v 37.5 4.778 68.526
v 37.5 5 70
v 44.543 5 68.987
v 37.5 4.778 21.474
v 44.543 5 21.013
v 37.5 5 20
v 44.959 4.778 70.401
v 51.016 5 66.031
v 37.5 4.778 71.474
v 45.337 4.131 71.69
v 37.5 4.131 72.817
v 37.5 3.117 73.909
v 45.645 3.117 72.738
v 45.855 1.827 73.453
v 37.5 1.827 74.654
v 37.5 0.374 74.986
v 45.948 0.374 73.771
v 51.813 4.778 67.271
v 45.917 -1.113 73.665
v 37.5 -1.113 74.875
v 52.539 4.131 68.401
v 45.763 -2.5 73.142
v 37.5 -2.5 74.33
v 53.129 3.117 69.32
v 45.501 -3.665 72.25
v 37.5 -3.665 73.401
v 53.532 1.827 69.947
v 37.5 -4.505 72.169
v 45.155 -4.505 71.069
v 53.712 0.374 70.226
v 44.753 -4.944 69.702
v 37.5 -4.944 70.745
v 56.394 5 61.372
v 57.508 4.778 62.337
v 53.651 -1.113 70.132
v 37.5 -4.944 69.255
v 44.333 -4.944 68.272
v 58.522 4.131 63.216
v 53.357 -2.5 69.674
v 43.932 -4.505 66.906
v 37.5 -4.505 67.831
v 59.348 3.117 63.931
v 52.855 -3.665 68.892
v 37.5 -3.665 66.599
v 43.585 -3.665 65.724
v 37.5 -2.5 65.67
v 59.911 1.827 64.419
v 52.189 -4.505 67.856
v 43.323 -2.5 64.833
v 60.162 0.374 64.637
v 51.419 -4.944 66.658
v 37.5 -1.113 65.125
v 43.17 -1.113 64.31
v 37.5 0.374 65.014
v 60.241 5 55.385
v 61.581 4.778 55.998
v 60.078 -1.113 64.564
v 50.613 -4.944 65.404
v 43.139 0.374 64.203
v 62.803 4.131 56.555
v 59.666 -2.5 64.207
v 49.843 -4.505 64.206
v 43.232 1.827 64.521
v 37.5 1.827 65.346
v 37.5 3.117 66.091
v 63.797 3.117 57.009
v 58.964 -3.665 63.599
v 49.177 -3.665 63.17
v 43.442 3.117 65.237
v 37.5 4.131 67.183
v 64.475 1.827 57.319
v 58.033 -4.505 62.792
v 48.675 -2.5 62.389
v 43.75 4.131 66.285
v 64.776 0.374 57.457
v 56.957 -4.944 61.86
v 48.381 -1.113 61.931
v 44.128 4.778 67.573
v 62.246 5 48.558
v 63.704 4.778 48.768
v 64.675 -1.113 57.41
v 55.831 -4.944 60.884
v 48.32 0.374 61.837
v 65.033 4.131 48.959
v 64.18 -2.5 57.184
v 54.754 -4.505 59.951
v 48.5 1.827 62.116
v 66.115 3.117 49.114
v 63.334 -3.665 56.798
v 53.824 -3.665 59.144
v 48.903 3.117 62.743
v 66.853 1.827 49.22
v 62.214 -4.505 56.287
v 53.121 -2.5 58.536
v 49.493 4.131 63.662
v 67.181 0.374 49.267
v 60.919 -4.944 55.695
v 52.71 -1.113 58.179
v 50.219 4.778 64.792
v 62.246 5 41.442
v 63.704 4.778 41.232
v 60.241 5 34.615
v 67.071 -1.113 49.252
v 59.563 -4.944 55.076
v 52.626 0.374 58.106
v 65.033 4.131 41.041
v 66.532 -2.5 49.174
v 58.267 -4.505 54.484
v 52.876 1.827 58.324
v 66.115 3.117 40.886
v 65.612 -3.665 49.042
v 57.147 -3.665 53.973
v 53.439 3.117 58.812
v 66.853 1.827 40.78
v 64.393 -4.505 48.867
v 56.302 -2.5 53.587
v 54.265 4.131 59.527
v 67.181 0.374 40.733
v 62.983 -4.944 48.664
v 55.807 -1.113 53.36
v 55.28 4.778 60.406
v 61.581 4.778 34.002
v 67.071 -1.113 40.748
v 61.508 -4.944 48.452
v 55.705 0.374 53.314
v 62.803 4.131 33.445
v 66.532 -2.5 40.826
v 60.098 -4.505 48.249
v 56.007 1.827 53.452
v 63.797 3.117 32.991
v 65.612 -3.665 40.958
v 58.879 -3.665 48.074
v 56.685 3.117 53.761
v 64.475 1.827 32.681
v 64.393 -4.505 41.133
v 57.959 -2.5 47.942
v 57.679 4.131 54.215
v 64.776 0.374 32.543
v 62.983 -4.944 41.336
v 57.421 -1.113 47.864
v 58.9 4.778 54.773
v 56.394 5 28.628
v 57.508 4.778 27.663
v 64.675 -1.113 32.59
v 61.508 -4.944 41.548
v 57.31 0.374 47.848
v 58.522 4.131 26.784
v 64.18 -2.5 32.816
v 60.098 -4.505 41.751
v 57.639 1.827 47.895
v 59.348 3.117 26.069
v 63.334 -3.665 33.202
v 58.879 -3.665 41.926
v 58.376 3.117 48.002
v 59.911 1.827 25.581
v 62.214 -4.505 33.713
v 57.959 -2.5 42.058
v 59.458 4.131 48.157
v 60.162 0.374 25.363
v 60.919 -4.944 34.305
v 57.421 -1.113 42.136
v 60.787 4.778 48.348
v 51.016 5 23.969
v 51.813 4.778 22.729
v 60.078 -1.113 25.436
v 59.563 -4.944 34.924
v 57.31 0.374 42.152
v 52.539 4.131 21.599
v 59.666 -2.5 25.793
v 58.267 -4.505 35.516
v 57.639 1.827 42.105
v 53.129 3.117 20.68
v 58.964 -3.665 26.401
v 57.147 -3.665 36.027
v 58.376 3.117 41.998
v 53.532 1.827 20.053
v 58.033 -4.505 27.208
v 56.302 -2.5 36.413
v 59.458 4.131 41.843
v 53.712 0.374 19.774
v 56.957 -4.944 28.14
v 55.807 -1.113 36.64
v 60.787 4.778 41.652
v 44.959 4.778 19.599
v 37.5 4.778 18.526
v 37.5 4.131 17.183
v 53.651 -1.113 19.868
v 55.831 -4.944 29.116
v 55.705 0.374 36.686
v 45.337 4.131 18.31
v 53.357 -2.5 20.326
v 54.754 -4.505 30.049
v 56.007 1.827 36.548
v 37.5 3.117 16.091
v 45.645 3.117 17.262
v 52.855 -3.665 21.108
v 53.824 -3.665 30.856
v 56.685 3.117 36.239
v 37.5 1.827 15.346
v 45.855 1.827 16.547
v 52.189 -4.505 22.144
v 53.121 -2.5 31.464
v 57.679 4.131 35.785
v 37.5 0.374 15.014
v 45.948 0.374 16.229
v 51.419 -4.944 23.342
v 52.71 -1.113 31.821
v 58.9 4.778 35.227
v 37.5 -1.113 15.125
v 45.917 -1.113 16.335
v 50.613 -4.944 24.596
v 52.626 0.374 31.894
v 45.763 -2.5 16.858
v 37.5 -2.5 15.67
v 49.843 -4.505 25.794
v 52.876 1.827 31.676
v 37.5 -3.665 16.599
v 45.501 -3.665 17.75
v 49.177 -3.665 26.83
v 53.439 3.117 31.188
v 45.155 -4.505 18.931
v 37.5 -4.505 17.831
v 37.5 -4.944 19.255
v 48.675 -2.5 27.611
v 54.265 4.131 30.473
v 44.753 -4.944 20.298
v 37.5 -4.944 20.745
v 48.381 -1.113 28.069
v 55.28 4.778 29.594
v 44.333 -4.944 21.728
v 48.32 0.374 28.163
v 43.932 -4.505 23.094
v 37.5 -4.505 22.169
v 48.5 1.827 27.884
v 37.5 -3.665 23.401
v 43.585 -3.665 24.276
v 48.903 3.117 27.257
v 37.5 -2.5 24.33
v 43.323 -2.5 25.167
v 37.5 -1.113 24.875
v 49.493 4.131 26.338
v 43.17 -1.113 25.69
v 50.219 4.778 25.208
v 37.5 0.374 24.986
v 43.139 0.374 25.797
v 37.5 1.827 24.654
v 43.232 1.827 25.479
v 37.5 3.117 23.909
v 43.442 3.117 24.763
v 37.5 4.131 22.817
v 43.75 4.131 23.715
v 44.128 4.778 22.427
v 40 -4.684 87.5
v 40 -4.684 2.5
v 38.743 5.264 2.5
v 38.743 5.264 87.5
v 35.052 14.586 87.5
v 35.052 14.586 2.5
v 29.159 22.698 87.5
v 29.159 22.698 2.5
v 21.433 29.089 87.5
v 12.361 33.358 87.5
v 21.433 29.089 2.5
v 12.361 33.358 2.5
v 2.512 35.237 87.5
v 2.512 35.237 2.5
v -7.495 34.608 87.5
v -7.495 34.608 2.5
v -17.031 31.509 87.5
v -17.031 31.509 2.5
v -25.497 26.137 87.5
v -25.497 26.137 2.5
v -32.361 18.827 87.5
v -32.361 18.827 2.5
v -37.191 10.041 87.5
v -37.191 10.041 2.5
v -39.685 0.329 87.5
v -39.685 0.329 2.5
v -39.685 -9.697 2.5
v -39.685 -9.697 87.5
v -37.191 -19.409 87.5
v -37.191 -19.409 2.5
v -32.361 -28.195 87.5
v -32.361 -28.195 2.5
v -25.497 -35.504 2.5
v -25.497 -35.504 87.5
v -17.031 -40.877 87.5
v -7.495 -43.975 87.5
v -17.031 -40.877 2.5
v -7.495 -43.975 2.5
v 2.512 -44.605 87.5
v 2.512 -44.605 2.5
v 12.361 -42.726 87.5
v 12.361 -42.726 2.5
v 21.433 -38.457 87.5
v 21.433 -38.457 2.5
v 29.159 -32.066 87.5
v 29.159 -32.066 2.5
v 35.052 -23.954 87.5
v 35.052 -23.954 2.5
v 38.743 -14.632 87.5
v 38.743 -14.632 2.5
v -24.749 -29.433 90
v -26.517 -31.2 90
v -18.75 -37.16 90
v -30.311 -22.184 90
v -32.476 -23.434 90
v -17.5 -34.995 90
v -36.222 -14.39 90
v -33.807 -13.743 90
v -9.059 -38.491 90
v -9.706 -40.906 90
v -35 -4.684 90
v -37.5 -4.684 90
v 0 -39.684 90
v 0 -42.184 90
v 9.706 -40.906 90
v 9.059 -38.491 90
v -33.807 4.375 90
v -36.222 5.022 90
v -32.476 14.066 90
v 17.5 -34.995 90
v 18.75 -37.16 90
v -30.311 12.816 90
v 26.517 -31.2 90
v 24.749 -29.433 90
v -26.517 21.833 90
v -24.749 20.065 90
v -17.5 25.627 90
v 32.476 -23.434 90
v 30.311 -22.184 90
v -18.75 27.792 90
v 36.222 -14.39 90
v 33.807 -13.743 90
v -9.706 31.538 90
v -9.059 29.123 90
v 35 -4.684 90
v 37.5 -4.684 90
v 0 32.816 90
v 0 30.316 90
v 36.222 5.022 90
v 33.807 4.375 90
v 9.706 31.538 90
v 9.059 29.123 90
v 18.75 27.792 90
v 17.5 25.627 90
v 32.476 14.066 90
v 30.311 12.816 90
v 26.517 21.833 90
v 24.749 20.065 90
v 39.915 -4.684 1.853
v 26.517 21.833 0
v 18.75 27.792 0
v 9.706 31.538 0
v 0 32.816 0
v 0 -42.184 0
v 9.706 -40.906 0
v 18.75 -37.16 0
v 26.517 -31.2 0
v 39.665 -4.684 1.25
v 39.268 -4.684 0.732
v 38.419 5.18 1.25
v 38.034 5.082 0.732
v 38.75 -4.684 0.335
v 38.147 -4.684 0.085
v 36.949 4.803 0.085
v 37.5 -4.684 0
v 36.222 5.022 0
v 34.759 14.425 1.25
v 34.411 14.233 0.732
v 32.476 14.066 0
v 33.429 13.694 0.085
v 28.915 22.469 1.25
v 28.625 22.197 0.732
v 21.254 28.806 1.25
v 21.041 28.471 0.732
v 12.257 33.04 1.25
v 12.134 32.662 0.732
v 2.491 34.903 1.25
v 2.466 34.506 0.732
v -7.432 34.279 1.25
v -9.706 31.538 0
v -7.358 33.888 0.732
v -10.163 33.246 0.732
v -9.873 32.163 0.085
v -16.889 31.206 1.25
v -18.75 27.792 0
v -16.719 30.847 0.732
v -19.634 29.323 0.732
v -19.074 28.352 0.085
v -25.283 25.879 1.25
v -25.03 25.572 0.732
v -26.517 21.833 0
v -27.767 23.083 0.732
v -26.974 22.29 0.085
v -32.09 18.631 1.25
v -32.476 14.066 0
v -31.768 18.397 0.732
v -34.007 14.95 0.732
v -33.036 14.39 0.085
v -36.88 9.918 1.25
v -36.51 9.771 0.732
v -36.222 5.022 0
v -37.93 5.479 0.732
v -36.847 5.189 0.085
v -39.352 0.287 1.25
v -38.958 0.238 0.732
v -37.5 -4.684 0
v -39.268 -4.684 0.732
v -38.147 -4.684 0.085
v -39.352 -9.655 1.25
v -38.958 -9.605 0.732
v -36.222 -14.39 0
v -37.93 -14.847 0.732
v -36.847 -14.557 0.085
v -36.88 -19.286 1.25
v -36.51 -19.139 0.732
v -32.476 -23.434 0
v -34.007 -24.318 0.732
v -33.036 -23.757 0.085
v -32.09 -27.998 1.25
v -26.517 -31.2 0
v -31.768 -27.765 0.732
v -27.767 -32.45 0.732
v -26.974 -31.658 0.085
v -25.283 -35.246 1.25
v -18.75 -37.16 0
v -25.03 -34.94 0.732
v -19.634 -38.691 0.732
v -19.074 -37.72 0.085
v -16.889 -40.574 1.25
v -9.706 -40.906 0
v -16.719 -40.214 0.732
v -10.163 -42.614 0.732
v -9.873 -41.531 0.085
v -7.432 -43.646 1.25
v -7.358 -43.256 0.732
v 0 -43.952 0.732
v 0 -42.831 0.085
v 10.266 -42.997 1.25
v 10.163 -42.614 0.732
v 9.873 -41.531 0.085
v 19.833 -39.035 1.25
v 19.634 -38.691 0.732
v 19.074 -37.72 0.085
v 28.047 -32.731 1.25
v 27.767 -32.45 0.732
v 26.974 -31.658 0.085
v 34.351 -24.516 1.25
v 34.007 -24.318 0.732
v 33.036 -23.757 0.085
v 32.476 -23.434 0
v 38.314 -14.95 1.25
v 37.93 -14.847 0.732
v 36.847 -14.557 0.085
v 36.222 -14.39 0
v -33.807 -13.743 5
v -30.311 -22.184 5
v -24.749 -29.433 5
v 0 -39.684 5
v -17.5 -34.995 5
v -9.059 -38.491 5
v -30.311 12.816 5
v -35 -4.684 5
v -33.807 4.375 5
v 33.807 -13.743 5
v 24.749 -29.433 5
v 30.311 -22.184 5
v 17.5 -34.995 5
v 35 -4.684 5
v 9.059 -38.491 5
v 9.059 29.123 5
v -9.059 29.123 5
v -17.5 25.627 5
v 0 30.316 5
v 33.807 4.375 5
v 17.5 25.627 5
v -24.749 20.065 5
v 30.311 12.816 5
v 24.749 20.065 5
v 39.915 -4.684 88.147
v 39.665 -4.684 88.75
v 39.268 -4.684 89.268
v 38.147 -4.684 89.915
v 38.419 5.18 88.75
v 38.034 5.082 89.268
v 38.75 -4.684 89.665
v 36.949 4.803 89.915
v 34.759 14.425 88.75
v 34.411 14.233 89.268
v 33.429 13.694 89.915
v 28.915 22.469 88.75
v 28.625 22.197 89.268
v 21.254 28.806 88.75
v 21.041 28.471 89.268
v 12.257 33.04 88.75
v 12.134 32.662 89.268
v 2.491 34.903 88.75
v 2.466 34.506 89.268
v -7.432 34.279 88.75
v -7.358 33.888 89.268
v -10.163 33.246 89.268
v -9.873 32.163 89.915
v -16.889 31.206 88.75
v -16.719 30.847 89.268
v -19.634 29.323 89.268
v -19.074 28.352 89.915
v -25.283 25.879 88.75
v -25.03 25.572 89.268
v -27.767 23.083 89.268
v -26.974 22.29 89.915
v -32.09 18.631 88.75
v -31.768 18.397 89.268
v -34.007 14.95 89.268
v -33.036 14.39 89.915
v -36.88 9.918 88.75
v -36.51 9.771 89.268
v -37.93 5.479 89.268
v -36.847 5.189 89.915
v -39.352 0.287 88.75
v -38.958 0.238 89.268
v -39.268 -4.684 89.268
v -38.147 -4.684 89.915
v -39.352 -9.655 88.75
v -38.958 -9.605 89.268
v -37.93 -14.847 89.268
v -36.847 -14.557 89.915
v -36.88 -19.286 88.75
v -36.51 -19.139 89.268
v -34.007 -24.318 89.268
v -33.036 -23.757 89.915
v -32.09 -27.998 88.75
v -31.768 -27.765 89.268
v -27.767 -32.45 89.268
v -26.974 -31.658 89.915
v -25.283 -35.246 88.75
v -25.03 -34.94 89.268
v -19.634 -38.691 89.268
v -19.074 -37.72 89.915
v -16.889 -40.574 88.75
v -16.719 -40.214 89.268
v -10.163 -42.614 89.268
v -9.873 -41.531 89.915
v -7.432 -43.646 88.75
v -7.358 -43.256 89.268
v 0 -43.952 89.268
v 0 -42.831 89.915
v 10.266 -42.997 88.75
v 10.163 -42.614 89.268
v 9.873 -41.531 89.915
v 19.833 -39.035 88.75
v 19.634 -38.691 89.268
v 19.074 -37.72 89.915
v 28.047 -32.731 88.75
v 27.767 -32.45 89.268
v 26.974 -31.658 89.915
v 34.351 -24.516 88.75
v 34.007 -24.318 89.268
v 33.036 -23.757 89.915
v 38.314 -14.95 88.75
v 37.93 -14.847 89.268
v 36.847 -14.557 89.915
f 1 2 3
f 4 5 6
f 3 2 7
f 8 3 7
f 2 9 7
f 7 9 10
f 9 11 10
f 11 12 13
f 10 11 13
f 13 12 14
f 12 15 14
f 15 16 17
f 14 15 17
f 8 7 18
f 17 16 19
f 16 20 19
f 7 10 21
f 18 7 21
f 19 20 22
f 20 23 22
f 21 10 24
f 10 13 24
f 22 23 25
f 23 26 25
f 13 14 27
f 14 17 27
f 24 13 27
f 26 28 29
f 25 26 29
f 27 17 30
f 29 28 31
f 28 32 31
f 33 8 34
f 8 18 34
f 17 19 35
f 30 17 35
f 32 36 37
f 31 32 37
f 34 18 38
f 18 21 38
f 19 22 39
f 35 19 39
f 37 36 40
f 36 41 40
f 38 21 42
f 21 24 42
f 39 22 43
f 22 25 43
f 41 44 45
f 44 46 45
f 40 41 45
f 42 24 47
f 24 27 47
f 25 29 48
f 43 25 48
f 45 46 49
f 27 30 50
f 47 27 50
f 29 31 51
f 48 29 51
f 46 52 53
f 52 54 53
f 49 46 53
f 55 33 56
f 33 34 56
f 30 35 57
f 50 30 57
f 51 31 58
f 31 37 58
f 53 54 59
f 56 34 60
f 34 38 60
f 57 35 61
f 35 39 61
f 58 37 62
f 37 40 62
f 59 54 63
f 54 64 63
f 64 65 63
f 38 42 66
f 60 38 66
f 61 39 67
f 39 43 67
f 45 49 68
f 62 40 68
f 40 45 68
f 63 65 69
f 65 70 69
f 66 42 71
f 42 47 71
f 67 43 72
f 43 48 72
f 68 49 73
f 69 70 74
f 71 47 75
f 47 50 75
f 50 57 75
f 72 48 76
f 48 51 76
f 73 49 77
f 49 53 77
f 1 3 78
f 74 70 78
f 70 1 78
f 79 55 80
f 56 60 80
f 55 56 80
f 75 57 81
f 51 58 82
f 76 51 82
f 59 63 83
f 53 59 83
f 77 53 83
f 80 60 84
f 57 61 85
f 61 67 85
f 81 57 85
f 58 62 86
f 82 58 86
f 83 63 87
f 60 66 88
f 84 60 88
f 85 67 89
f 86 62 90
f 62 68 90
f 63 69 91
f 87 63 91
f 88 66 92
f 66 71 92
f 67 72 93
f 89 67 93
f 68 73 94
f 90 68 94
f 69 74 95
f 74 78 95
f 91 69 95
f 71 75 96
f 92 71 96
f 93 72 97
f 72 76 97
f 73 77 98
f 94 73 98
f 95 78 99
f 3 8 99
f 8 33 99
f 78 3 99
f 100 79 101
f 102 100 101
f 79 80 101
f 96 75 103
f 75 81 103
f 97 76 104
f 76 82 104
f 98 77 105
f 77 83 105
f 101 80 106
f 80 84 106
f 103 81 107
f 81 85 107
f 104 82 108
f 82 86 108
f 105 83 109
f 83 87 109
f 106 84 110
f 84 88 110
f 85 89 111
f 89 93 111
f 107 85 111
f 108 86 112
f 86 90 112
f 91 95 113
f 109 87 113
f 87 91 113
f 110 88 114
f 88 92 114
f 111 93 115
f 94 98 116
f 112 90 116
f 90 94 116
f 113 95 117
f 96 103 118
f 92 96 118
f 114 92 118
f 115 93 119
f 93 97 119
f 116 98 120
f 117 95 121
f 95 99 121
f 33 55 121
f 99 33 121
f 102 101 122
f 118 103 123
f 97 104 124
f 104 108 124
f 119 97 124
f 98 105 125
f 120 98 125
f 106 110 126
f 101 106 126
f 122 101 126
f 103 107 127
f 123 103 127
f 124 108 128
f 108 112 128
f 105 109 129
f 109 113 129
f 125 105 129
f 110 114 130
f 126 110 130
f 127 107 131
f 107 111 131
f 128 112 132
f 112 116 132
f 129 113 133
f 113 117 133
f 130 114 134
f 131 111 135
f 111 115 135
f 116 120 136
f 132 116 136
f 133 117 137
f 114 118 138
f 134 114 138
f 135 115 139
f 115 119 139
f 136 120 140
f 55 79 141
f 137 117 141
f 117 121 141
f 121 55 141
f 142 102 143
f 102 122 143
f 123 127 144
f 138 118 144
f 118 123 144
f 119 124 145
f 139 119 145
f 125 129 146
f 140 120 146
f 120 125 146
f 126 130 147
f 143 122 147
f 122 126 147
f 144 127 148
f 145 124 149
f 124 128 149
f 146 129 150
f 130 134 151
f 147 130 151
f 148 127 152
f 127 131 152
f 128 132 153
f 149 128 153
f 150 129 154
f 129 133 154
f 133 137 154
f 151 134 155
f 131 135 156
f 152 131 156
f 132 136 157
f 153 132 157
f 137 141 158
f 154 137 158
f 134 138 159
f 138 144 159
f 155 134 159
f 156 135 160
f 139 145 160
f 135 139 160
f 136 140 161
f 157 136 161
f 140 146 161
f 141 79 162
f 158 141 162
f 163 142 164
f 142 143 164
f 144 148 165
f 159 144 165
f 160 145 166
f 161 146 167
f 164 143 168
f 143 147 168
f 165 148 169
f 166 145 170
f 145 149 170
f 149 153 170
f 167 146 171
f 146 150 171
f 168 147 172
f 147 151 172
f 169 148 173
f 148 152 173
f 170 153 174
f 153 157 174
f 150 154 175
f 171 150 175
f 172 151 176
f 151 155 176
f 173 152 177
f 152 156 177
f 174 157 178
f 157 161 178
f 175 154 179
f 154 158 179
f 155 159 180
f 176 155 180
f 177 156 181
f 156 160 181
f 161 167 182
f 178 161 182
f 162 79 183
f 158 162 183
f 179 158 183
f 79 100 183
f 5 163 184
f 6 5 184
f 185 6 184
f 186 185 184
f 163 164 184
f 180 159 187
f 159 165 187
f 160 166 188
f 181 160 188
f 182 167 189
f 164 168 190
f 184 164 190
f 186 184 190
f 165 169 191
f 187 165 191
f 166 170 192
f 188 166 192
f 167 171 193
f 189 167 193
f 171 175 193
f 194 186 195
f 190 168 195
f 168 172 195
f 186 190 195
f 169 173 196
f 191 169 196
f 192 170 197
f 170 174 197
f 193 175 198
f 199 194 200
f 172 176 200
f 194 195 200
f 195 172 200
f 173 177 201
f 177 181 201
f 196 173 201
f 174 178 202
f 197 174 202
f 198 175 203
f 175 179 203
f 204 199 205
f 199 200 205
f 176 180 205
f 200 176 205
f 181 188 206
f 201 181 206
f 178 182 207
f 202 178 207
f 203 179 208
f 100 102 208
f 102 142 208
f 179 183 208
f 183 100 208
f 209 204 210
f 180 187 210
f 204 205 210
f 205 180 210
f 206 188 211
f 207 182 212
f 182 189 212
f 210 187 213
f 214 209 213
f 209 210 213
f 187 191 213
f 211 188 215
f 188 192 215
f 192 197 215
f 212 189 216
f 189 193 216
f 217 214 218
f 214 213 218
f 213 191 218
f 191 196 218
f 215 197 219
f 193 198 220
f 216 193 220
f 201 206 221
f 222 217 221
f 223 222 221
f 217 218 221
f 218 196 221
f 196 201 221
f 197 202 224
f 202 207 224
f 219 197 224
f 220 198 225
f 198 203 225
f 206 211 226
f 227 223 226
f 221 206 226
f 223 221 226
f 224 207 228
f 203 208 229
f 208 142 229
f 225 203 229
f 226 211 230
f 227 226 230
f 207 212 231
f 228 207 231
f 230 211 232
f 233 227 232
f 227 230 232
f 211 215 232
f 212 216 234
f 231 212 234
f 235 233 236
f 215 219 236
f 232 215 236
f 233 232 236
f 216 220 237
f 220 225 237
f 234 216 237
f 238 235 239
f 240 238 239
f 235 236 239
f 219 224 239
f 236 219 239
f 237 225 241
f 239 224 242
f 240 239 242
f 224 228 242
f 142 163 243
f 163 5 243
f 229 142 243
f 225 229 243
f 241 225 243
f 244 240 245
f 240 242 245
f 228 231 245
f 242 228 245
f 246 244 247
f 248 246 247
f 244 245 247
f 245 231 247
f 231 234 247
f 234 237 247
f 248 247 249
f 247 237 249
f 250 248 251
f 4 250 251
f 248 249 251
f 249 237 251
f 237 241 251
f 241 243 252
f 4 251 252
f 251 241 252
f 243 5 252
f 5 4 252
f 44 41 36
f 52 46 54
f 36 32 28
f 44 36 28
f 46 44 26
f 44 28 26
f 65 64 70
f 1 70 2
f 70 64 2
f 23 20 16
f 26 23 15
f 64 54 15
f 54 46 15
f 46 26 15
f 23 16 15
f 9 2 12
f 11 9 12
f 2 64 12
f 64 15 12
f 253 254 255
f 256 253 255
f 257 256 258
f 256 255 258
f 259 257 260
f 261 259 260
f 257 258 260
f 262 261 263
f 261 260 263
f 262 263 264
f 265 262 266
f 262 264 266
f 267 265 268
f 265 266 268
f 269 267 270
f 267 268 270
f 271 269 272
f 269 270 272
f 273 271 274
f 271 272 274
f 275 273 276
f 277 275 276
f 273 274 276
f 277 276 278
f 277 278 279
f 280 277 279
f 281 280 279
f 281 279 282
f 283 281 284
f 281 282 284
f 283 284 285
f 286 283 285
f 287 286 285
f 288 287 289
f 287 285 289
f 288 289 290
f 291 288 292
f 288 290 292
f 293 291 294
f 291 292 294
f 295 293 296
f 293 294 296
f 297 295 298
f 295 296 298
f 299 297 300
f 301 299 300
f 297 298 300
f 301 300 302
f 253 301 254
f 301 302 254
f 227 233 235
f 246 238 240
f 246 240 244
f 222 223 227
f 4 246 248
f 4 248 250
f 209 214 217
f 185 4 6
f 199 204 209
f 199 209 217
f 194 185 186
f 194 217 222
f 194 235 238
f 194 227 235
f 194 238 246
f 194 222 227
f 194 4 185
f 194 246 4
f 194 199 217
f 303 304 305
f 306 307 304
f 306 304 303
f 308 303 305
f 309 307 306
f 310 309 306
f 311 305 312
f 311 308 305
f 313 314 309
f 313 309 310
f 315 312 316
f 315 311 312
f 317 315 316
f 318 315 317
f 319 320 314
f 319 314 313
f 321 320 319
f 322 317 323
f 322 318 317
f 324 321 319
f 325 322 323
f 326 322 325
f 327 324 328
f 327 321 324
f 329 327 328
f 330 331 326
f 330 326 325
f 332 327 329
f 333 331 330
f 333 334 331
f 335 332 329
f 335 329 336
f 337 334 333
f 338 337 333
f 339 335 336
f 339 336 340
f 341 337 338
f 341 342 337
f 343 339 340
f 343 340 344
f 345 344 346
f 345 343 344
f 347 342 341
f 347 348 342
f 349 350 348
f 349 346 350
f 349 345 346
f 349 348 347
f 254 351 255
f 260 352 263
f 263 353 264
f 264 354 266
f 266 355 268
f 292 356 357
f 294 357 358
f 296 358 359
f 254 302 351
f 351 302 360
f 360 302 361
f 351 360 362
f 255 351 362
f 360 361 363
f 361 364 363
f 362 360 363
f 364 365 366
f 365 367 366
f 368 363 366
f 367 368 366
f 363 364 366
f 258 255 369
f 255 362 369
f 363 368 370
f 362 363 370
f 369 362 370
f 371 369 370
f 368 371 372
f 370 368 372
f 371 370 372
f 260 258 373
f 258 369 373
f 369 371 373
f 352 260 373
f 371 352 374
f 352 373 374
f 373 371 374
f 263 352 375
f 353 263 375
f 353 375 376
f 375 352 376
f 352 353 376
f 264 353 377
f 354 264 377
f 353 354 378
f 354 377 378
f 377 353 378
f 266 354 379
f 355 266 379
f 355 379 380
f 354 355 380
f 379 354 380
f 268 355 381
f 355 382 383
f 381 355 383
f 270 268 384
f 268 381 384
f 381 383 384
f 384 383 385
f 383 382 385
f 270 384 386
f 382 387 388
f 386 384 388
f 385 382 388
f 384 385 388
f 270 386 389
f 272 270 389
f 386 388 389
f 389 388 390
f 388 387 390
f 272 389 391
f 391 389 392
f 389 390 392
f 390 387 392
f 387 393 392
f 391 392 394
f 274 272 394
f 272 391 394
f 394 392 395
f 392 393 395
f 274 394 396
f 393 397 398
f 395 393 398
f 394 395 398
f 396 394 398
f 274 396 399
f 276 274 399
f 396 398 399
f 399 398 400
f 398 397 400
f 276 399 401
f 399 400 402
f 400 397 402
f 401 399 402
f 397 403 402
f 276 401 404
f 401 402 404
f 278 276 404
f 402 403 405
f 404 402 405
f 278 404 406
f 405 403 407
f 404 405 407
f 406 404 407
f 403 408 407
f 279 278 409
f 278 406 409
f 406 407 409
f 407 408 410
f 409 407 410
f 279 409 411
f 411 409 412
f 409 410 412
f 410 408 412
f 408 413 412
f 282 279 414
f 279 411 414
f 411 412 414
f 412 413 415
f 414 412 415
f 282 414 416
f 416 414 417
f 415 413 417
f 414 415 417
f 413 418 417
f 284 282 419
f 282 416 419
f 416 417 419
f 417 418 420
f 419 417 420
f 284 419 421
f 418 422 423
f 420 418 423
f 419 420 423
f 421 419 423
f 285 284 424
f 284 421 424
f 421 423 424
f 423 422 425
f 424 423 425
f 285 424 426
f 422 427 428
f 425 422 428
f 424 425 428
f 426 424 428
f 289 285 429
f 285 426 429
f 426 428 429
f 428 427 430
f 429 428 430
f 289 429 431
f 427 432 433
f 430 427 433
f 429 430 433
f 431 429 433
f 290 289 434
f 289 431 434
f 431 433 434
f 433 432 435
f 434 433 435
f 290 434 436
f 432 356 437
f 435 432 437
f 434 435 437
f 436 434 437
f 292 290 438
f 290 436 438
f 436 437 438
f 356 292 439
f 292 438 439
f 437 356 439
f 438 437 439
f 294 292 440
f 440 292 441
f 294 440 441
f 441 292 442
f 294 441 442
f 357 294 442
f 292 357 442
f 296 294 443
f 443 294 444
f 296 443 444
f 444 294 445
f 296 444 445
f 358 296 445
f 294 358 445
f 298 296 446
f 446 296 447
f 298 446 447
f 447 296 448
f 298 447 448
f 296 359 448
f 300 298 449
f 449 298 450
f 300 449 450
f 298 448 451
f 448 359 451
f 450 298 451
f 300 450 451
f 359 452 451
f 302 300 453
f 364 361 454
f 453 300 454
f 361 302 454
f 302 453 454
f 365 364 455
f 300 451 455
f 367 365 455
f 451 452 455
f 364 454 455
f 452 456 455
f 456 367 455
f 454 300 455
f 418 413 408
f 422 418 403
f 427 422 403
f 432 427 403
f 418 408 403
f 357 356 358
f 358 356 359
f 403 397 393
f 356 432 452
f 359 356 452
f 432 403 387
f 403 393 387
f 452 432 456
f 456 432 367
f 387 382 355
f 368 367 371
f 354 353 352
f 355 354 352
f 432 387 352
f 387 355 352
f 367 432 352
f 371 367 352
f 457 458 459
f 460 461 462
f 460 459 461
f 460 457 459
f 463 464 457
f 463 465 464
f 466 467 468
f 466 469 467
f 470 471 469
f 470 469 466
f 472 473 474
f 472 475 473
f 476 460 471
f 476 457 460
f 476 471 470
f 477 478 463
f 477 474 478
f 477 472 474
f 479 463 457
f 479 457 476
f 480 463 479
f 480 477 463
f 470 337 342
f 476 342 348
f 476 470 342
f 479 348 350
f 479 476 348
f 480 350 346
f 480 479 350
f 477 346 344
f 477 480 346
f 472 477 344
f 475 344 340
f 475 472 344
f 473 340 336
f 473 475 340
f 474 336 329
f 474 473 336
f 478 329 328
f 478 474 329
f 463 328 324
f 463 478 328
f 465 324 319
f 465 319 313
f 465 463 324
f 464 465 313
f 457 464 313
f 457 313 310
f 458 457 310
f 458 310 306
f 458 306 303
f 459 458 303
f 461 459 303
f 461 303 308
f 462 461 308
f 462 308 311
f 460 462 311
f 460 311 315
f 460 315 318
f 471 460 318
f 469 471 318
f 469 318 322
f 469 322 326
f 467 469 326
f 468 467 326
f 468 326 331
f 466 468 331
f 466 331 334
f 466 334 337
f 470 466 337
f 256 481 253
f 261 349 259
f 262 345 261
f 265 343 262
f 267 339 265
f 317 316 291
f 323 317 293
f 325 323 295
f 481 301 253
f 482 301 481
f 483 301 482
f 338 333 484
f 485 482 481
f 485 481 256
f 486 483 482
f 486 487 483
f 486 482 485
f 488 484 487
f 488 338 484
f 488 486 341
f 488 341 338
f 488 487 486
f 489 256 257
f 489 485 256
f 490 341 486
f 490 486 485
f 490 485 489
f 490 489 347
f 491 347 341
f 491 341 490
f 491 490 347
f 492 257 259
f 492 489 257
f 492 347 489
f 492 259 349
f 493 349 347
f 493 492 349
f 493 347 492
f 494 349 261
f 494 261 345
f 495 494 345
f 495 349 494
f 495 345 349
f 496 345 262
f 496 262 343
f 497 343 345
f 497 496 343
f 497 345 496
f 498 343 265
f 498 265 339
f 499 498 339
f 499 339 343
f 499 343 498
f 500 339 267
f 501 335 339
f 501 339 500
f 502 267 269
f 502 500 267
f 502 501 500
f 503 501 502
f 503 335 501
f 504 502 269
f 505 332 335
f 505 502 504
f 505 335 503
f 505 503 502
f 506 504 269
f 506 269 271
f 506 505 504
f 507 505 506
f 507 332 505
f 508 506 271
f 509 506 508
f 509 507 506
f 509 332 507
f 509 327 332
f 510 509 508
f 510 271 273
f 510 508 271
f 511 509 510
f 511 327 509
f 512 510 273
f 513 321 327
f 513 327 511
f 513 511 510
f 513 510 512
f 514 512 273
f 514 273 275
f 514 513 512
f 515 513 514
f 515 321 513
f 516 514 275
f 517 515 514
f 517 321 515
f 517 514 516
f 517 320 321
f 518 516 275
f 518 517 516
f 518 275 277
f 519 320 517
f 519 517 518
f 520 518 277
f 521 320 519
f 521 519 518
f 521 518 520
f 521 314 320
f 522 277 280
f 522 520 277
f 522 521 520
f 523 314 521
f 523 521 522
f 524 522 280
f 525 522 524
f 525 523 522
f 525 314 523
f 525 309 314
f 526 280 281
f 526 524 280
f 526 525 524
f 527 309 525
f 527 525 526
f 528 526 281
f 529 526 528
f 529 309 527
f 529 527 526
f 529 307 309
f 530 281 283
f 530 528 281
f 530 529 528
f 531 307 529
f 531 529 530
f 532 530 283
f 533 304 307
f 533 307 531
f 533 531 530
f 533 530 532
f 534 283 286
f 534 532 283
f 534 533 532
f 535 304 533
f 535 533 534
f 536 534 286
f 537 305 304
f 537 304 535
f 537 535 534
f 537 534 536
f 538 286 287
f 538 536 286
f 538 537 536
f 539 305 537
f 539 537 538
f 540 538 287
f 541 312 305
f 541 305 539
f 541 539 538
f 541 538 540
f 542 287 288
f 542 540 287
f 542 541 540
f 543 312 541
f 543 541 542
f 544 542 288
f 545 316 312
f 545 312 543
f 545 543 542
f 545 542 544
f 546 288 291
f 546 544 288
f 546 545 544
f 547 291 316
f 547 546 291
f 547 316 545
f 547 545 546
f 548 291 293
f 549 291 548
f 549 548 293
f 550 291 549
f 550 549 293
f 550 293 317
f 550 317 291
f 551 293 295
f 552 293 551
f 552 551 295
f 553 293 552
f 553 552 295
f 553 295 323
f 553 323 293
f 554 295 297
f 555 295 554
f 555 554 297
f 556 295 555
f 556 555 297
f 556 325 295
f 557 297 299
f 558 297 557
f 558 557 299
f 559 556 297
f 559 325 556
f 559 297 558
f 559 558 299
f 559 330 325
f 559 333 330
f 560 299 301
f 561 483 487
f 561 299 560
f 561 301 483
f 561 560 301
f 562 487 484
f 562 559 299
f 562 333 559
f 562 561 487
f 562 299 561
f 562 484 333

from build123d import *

# Parameters (mm, degrees)
F0_R     = 40
F1_DEPTH = 90
F2_T     = -5
F4_R     = 5
F5_ANGLE = 180
F6_R     = 2.5


with BuildPart() as f1:
    # F0 (on Top) → F1 (new body)
    with BuildSketch(Plane.XY):
        with Locations((0, -4.683932)):
            Circle(F0_R)
    extrude(amount=F1_DEPTH)

    # F2
    f2_openings = [f1.faces().sort_by_distance(p)[0] for p in [
        (0, -4.683932, 90),
    ]]
    offset(amount=F2_T, openings=f2_openings)

    # F6
    f6_edges = [f1.edges().sort_by_distance(p)[0] for p in [
        (-40, -4.683932, 90),
        (-40, -4.683932, 0),
    ]]
    fillet(f6_edges, radius=F6_R)


with BuildPart() as f5:
    # F4 (on offset) → F5 (revolve)
    with BuildSketch(Plane.YZ.offset(37.5)):
        with Locations((0, 70)):
            Circle(F4_R)
    revolve(axis=Axis((37.5, 9.839395, 45), (0, 1, 0)), revolution_arc=F5_ANGLE)


solid = Compound([f1.part, f5.part])
